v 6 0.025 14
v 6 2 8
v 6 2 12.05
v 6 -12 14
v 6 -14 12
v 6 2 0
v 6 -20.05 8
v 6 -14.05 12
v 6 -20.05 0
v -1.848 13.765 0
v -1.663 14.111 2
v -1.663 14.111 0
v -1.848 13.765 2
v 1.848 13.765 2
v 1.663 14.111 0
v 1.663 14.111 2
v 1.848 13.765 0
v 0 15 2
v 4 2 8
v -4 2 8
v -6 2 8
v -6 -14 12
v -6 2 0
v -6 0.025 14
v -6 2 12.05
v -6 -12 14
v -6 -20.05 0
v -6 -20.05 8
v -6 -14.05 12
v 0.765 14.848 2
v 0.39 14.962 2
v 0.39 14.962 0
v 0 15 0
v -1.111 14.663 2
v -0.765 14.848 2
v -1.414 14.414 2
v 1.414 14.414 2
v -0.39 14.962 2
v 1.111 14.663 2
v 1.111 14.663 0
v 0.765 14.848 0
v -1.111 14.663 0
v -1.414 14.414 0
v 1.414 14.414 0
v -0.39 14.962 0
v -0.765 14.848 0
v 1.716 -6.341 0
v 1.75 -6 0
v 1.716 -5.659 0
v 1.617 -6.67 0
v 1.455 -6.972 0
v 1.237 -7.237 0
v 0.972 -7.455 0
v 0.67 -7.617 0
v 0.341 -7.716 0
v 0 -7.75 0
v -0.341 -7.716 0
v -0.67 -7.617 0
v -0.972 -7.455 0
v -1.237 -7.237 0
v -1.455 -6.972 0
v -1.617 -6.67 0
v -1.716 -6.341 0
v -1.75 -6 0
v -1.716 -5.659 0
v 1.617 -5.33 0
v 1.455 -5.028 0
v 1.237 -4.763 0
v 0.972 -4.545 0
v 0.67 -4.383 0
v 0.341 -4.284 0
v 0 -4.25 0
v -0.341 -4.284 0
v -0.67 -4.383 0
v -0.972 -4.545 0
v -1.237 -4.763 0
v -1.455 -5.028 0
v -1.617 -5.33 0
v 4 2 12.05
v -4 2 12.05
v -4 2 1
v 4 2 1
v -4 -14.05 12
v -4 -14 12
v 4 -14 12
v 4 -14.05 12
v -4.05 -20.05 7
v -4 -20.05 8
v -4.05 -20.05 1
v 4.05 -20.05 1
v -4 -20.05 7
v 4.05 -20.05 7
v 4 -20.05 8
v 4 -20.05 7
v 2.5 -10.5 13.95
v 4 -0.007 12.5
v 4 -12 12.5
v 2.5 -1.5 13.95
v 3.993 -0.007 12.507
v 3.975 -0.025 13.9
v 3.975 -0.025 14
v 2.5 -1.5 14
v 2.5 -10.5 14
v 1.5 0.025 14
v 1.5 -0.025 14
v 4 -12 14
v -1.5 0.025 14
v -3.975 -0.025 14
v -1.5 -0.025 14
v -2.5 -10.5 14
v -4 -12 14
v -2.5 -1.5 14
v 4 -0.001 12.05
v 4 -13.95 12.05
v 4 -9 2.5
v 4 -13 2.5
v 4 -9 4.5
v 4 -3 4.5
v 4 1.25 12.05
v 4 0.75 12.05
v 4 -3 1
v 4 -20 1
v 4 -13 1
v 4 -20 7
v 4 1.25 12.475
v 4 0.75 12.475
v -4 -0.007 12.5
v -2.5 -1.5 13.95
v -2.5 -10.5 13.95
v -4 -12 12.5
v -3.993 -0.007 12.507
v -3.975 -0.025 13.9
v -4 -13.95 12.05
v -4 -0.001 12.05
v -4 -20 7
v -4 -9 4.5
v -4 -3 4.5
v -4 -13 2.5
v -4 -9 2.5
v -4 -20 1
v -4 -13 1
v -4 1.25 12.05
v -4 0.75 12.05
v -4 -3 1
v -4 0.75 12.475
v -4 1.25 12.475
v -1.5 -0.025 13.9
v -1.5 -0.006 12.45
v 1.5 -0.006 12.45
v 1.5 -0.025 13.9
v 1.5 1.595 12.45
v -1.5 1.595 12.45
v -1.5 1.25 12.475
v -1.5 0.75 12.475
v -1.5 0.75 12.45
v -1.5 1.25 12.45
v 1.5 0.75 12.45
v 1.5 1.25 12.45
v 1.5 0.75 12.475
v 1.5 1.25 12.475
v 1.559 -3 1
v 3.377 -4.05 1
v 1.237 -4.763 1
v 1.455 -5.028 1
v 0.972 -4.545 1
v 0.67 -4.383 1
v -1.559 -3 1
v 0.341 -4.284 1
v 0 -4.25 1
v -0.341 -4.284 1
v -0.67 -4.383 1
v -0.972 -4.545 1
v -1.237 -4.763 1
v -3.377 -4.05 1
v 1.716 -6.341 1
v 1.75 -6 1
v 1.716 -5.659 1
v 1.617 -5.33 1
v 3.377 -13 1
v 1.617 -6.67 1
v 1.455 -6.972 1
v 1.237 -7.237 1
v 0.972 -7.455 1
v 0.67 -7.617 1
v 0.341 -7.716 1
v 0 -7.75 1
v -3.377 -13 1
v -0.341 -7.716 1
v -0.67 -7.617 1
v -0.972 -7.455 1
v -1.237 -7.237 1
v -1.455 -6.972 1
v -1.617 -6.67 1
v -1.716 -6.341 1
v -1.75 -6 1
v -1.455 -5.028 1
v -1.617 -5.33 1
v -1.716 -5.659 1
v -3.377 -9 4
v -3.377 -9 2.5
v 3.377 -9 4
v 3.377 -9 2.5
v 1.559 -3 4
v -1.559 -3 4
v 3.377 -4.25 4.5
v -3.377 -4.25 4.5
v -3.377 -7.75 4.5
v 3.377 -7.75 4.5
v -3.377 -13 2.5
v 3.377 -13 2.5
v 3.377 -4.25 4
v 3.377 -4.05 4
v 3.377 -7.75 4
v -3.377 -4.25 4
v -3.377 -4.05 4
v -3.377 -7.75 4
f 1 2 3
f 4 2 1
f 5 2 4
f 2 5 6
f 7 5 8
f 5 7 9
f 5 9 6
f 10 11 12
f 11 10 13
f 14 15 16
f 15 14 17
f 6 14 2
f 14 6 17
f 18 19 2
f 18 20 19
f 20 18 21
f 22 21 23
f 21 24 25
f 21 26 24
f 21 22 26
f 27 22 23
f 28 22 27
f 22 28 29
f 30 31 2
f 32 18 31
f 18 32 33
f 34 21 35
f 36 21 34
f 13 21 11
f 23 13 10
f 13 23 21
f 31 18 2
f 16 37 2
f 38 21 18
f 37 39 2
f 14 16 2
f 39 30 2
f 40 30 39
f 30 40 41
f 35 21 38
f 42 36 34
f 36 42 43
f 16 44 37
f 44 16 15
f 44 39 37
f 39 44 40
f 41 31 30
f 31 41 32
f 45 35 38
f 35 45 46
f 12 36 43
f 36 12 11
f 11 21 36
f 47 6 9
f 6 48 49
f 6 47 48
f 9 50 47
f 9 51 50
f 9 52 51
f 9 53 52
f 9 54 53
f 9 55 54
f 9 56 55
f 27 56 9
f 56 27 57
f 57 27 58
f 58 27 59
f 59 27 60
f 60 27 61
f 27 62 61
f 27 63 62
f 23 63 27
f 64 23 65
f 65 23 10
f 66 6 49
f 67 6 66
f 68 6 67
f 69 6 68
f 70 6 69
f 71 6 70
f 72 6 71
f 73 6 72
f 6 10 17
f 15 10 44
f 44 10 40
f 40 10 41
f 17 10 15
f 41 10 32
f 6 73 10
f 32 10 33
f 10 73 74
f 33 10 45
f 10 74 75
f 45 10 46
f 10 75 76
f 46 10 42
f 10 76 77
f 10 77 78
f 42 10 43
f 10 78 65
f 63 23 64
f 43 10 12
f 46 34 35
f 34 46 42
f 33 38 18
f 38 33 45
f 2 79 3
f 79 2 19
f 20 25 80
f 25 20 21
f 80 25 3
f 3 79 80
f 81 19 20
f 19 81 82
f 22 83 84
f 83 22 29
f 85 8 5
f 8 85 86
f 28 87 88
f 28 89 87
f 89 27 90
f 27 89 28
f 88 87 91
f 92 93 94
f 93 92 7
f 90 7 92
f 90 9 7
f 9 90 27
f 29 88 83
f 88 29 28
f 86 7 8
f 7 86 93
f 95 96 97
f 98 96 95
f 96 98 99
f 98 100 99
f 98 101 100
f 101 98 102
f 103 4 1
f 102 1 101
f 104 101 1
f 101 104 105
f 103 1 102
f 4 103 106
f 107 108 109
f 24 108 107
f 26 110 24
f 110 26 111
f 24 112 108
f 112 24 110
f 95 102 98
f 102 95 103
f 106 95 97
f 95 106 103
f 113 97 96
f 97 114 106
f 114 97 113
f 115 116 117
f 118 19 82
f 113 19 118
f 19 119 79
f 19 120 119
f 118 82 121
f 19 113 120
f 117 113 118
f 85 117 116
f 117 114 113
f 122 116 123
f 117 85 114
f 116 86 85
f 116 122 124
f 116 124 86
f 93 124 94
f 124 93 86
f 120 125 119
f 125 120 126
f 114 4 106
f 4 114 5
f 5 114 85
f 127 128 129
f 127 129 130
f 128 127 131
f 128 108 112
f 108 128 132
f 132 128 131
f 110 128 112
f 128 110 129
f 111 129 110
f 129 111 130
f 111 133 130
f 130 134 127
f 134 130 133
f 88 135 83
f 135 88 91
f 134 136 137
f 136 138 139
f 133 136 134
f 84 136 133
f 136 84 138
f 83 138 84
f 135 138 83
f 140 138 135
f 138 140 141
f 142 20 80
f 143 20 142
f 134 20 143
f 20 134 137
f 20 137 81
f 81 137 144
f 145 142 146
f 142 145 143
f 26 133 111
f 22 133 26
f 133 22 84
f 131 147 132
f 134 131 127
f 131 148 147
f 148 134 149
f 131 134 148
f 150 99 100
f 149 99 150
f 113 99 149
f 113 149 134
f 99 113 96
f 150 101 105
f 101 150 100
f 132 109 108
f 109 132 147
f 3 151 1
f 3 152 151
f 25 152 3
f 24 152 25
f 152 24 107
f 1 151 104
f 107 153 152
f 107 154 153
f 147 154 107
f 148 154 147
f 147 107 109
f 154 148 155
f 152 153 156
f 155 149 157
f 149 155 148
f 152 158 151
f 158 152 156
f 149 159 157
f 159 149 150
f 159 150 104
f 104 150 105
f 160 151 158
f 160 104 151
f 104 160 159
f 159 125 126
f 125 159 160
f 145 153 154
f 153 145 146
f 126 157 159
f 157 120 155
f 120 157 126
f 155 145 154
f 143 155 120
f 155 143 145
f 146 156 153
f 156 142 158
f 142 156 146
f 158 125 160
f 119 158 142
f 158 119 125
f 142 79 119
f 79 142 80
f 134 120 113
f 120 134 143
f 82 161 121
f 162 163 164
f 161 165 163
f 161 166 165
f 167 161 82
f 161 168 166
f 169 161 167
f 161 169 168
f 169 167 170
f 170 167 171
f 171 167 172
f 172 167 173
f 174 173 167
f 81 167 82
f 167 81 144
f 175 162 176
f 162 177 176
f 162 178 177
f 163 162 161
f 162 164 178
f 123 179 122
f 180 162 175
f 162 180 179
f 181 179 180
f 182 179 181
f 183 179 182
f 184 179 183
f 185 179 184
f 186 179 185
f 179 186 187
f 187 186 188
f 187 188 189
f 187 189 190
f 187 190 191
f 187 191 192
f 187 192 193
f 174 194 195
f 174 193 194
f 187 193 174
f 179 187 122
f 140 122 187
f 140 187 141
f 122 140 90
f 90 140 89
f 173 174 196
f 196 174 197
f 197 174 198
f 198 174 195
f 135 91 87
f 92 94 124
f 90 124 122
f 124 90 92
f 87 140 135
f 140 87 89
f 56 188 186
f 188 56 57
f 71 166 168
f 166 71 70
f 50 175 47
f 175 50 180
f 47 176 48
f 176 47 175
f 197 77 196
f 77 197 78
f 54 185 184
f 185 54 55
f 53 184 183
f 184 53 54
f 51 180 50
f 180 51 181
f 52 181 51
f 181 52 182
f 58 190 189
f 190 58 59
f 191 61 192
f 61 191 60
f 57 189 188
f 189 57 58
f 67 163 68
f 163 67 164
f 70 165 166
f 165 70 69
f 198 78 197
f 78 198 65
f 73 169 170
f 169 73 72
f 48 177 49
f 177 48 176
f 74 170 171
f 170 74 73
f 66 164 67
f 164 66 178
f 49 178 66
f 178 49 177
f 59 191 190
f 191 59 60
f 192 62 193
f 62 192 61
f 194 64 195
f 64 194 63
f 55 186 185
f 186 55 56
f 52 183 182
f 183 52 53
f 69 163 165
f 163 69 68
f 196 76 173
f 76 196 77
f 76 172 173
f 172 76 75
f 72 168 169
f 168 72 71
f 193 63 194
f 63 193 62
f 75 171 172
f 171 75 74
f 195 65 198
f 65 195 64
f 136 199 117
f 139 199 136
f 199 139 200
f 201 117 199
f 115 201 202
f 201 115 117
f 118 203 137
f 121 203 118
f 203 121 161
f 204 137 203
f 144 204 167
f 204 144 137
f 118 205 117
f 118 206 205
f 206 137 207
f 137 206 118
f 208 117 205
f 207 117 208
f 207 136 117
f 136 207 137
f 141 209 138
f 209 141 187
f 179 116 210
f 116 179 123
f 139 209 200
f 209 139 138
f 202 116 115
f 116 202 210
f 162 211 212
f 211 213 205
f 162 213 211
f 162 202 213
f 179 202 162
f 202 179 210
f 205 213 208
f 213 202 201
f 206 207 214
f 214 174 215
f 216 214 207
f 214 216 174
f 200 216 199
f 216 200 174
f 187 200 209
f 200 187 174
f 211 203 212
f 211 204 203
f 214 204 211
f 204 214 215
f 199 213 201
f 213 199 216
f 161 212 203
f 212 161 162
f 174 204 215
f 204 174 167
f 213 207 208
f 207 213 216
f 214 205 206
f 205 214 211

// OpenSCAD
// file: microscope_parameters.scad
/******************************************************************
*                                                                 *
* OpenFlexure Microscope: Microscope Parameters                   *
*                                                                 *
* This is the top-level configuration file for the OpenFlexure    *
* microscope, an open microscope and 3-axis translation stage.    *
* It gets really good precision over a ~10mm range, by using      *
* plastic flexure mechanisms.                                     *
*                                                                 *
* Generally I've tried to put parts (or collections of closely    *
* related parts) in their own files.  However, all the parts      *
* depend on the geometry of the microscope - so these parameters  *
* are gathered together here.  In general, the ones you might     *
* to change are towards the top!  Lower-down ones are defined in  *
* terms of higher-up ones - confusion might arise if you redefine *
* these later...                                                  *
*                                                                 *
* (c) Richard Bowman, January 2016                                *
* Released under the CERN Open Hardware License                   *
*                                                                 *
* http://www.github.com/rwb27/openflexure_microscope              *
* http://www.docubricks.com/projects/openflexure-microscope       *
* http://www.waterscope.org                                       *
*                                                                 *
******************************************************************/

d = 0.05;
$fn=32;

// These are the most useful parameters to change!
motor_lugs = true;
version_numstring = "6.1.3";
camera = "picamera_2"; //see cameras/camera.scad for valid values
optics = "rms_f50d13"; //see optics.scad for valid values
led_r = 4.5/2; //size of the LED used for illumination
endstops = false; //whether to build mounts for optical endstops inside the microscope.
feet_endstops = false; //whether to include cut-outs for endstop switches in the feet. 
beamsplitter = false; //enables a cut-out in some optics modules for a beamsplitter
smart_brim_r = 5;
enable_smart_brim = false;

// This sets the basic geometry of the microscope
sample_z = 75; // z position of sample
leg_height = sample_z-10; // height of the top of the leg. Shorter by 10 to give space to insert nuts.

leg_r = 30; // radius on which the innermost part of legs sit. (This sets the stage size)
hole_r = 20; // size of hole in the stage
xy_lever_ratio = 4.0/7.0; // mechanical advantage of actuator over stage - can be used to trade speed and precision
z_lever_ratio = 1.0; // as above, for Z axis (must be >1)

// The variables below affect the position of the objective mount
z_strut_l = 18; //length of struts supporting Z carriage
objective_mount_y = 18; // y position of clip for optics
objective_mount_nose_w = 6; // width of the pointy end of the mount
condenser_clip_w = 14; // width of the dovetail clip for the condenser
foot_height=feet_endstops?15:15; //the endstops need a bit of extra height (or not)

// These variables set the dimensions of flexures
// You might want to tweak them if your material (or printer)
// is different from the ones I've tested, though ABS/PLA extrusion
// is generally fine with my parameters
stage_flex_w = 4; // width of XY axis flexures
zflex_l = 1.5;    // length of (all) flexible bits
zflex_t = 0.75;   // thickness of (all) flexible bits
zflex = [stage_flex_w, zflex_l, zflex_t]; // the above in new-style format
flex_a = 0.15;    // sine of the angle through which flexures can be bent

// Compile a sensible version string
version_string = str("v",version_numstring, sample_z, motor_lugs?"-M":"");
echo(str("Compiling OpenFlexure Microscope ",version_string));


leg_block_t = 5; // Thickness of the block at the top and bottom of the leg
stage_t = sample_z-leg_height + leg_block_t; //thickness of the XY stage (at thickest point, most is 1mm less)
stage_hole_inset = zflex_l+4; // how far the holes on the XY stage are inset from leg_r
flex_z1 = 0;      // z position of lower flexures for XY axis
flex_z2 = leg_height-leg_block_t; //height of upper XY flexures
z_strut_t = 6;  // (z) thickness of struts for Z axis
z_flex_w = 4;   // width of struts for Z axis
leg = [4,stage_flex_w,flex_z2+zflex_t]; // size of vertical legs
leg_middle_w = 12; // width of the middle part of each leg
actuator_h = 25; //height of the actuator columns
dz = 0.5; //small increment in Z (~ 2 layers)

leg_outer_w = leg_middle_w + 2*zflex_l + 2*leg[0]; // overall width of parallelogram legs that support the stagef
actuator = [3*1.2+2*2,(flex_z2 - flex_z1)*xy_lever_ratio,6]; // dimensions of the core part of the actuating levers for X and Y - NB should match the column_base_r in compact_nut_seat.scad
actuating_nut_r = (flex_z2 - flex_z1)*xy_lever_ratio; // distance from leg_r to the actuating nut/screw for the XY axes
xy_actuator_travel = actuating_nut_r*0.15; // distance moved by XY axis actuators

// Z axis
z_flexures_z1 = 8; // height of the lower flexure on z actuator
z_flexures_z2 = min(leg_height - 12, 35); // height of the upper flexure on z actuator
objective_mount_back_y = objective_mount_y + 2; //back of objective mount
z_anchor_y = objective_mount_back_y + z_strut_l + 2*zflex[1]; // fixed end of the flexure-hinged lever that actuates the Z axis
z_anchor_w = 20; //width of the Z anchor
zll = (z_strut_l + zflex[1])*z_lever_ratio; //required actuator lever length
zfz = z_flexures_z1; // shorthand for the next line only!
z_nut_y = z_anchor_y - zflex[1]/2 + sqrt(zll*zll - zfz*zfz);
z_actuator_travel = zll*0.15; // distance moved by the Z actuator
z_actuator_tilt = -asin(z_flexures_z1/zll); //angle of the Z actuator

z_flexure_x = (leg_r-zflex_l-max(5,leg[2]*0.1))*sqrt(2); // x position of the outside of the Z-axis static anchors (either side of the XY stage, on the X axis) (no longer used by Z axis but still in use elsewhere.)

bridge_dz = 10; // spacing between thin links on legs
base_t=1; // thickness of the flat base of the structure
wall_h=15; // height of the stiffening vertical(ish) walls
wall_t=2; //thickness of the stiffening walls
zawall_h = z_flexures_z2 - 10; //height of wall near Z anchor
zbwall_h = z_flexures_z2 - 10; //height of bridge over Z lever
illumination_clip_y = (-(leg_r-zflex_l-wall_t/2+leg_outer_w/2)/sqrt(2)
                       -wall_t/2-1); //position of clip for
                      // illumination/back foot.  This is set to
                      // coincide with the wall between the back
                      // two legs. TODO: remove this
illumination_arm_screws = [[20,z_nut_y,leg_height-2],[-20,z_nut_y,leg_height-2], 
                           [0,(leg_r + leg_outer_w)/sqrt(2) + 4,leg_height-2]];
                      // positions of screws that mount the adjustable version of the 
                      // illumination arm
condenser_clip_y = -8; //position of dovetail for old condenser assembly TODO: rename this
base_mounting_holes = [[-20,z_nut_y-4,0],
                       [20,z_nut_y-4,0],
                       [-z_flexure_x-4,-8,0],
                       [z_flexure_x+4,-8,0]]; 
                       // holes to screw the microscope to a baseplate

endstop_extra_ringheight=feet_endstops?1:0;
endstop_hole_offset=0;
//this is a temporary option to printfeet with smaller travel
//without this with 15mm hole the stage hits the objective
//the stage can move ~3mm in each direction, so the actuator only moves
//~1.7 mm
avoid_objective_xyfoot_offset=xy_actuator_travel-1.8;

fl_cube_w = 16; //width of the fluorescence filter cube
// main file
/******************************************************************
*                                                                 *
* OpenFlexure Microscope: Back foot (in case you are not using    *
* the microscope stand).                                          *
*                                                                 *
* This is part of the OpenFlexure microscope, an open-source      *
* microscope and 3-axis translation stage.  It gets really good   *
* precision over a ~10mm range, by using plastic flexure          *
* mechanisms.                                                     *
*                                                                 *
* (c) Richard Bowman, January 2016                                *
* Released under the CERN Open Hardware License                   *
*                                                                 *
******************************************************************/

use <utilities.scad>;
use <dovetail.scad>;
include <microscope_parameters.scad>;

// geometry is now defined by microscope_parameters.scad

clip_w = 12; //external width of clip for dovetail
clip_h = 12; //height of dovetail clip
bottom = -foot_height; //the foot extends below the bottom of the dovetail
  //currently this is also defined in nut_seat_with_flex.scad, should
  //move them both to microscope_parameters really!

led_d = 5; // LED diameter in mm if you want a bigger LED
led_angle = 22; //cone angle for LED beam
working_distance = clip_h + 0; //wd should be >= clip_h so it fits on nicely...
                //working_distance is the distance from condenser to stage
condenser=false;

stage_clearance=6;
shift=[0,0,0];
w = clip_w; //width (size in x direction)
b = 8; //breadth (size of main pillar in y direction)
back = illumination_clip_y-b-stage_clearance; //y coordinate of back of pillar
wd = working_distance; //distance from bottom of "condenser" to sample
arm_h = b; //height of the horizontal arm (cross-sectional size in z)
arm_w = b; //width of the arm (cross-sectional size in x)
t = 1; //thickness of shell
clip_t = 2; //thickness of arms for the dovetail clip
hole_h = max(stage_clearance, b); //height of cut-out above clip
dt_taper = 2; //size of sloping part at top/bottom of dovetail

module back_foot(clip_y=illumination_clip_y,stage_clearance=6){
    // Arm that clips on to the microscope, providing the back foot
    // and illumination mount
    w = clip_w; //width (size in x direction)
    difference(){
        $fn=32;
        union(){
            sequential_hull(){
                translate([0,back,bottom+clip_t]) rotate([-90,0,0])cylinder(r=clip_t,h=2); //foot
                union(){ //platform for mounting screw
                    translate([-w/2,back,-dt_taper]) cube([w,b,dt_taper]);
                    //translate([0,illumination_clip_y+3,-dt_taper]) cylinder(d=w, h=dt_taper);
                }
                translate([-w/2,back,-dt_taper]) cube([w,b+stage_clearance-2,d]); //dovetail mounts here
                translate([-w/2,back,clip_h+dt_taper]) cube([w,b+stage_clearance-2,d]); //dovetail mounts here
                translate([-w/2,back,clip_h+hole_h]) cube([w,b,d]); //start of main shaft
            }
            translate([0,illumination_clip_y,0]) rotate([-90,180,0]) dovetail_clip_y([clip_w,clip_h,2+d],t=clip_t,taper=dt_taper,endstop=true);
        }
        
        // make the structure hollow, for faster printing and 
        // cable management
        hw = w - 2*clip_t; // width of hole near dovetail clip
        sequential_hull(){
            //translate([0,back,bottom+clip_t
            translate([-hw/2,back+t,-dt_taper]) cube([hw,b+stage_clearance-2-t+d,d]); //dovetail mounts here
            translate([-hw/2,back+t,clip_h+dt_taper]) cube([hw,b+stage_clearance-2-t+d,d]); //dovetail mounts here
            translate([-hw/2,back+t,clip_h+hole_h]) cube([hw,b-t+d,d]);//top of hole
            translate([-hw/2,back+t,clip_h+hole_h]) cube([hw,b-2*t,d]);//start of bridge over the main shaft
            translate([-w/2+t,back+t,clip_h+hole_h+clip_t-t]) cube([w-2*t,b-2*t,d]);//main shaft starts here
        }
        // entry hole for an M3 screw to mount it to a box
        translate([0,back+t+3/2,clip_h/2]) rotate([90,0,0]) cylinder(d=3.5,h=999, center=true);
    }
    // nut trap for mounting to box (see entry hole above)
    translate([0,back+t+3/2,clip_h/2]) difference(){
        union(){ //thicken the back to hold the nut trap
            cube([w,4,6],center=true);
            translate([0,-1,3]) cube([w,2,8],center=true);
        }
        //cut-out for the nut:
        hull() repeat([0,0,10],2) rotate([90,30,0]) cylinder(r=3*1.3,h=3,center=true, $fn=6);
        cube([2*3*1.3*cos(30),999,3.5],center=true); //screw clearance
    }
}

module print_ready_parts(){
    // make a nice, compact assembly of all the parts, sitting on z=0
    translate([0,0,-back]) rotate([90,0,0]) back_foot();
}

module parts_in_situ(){
    // generate all the parts as they would appear in the microscope.
    back_foot();
}

print_ready_parts();
//parts_in_situ();
